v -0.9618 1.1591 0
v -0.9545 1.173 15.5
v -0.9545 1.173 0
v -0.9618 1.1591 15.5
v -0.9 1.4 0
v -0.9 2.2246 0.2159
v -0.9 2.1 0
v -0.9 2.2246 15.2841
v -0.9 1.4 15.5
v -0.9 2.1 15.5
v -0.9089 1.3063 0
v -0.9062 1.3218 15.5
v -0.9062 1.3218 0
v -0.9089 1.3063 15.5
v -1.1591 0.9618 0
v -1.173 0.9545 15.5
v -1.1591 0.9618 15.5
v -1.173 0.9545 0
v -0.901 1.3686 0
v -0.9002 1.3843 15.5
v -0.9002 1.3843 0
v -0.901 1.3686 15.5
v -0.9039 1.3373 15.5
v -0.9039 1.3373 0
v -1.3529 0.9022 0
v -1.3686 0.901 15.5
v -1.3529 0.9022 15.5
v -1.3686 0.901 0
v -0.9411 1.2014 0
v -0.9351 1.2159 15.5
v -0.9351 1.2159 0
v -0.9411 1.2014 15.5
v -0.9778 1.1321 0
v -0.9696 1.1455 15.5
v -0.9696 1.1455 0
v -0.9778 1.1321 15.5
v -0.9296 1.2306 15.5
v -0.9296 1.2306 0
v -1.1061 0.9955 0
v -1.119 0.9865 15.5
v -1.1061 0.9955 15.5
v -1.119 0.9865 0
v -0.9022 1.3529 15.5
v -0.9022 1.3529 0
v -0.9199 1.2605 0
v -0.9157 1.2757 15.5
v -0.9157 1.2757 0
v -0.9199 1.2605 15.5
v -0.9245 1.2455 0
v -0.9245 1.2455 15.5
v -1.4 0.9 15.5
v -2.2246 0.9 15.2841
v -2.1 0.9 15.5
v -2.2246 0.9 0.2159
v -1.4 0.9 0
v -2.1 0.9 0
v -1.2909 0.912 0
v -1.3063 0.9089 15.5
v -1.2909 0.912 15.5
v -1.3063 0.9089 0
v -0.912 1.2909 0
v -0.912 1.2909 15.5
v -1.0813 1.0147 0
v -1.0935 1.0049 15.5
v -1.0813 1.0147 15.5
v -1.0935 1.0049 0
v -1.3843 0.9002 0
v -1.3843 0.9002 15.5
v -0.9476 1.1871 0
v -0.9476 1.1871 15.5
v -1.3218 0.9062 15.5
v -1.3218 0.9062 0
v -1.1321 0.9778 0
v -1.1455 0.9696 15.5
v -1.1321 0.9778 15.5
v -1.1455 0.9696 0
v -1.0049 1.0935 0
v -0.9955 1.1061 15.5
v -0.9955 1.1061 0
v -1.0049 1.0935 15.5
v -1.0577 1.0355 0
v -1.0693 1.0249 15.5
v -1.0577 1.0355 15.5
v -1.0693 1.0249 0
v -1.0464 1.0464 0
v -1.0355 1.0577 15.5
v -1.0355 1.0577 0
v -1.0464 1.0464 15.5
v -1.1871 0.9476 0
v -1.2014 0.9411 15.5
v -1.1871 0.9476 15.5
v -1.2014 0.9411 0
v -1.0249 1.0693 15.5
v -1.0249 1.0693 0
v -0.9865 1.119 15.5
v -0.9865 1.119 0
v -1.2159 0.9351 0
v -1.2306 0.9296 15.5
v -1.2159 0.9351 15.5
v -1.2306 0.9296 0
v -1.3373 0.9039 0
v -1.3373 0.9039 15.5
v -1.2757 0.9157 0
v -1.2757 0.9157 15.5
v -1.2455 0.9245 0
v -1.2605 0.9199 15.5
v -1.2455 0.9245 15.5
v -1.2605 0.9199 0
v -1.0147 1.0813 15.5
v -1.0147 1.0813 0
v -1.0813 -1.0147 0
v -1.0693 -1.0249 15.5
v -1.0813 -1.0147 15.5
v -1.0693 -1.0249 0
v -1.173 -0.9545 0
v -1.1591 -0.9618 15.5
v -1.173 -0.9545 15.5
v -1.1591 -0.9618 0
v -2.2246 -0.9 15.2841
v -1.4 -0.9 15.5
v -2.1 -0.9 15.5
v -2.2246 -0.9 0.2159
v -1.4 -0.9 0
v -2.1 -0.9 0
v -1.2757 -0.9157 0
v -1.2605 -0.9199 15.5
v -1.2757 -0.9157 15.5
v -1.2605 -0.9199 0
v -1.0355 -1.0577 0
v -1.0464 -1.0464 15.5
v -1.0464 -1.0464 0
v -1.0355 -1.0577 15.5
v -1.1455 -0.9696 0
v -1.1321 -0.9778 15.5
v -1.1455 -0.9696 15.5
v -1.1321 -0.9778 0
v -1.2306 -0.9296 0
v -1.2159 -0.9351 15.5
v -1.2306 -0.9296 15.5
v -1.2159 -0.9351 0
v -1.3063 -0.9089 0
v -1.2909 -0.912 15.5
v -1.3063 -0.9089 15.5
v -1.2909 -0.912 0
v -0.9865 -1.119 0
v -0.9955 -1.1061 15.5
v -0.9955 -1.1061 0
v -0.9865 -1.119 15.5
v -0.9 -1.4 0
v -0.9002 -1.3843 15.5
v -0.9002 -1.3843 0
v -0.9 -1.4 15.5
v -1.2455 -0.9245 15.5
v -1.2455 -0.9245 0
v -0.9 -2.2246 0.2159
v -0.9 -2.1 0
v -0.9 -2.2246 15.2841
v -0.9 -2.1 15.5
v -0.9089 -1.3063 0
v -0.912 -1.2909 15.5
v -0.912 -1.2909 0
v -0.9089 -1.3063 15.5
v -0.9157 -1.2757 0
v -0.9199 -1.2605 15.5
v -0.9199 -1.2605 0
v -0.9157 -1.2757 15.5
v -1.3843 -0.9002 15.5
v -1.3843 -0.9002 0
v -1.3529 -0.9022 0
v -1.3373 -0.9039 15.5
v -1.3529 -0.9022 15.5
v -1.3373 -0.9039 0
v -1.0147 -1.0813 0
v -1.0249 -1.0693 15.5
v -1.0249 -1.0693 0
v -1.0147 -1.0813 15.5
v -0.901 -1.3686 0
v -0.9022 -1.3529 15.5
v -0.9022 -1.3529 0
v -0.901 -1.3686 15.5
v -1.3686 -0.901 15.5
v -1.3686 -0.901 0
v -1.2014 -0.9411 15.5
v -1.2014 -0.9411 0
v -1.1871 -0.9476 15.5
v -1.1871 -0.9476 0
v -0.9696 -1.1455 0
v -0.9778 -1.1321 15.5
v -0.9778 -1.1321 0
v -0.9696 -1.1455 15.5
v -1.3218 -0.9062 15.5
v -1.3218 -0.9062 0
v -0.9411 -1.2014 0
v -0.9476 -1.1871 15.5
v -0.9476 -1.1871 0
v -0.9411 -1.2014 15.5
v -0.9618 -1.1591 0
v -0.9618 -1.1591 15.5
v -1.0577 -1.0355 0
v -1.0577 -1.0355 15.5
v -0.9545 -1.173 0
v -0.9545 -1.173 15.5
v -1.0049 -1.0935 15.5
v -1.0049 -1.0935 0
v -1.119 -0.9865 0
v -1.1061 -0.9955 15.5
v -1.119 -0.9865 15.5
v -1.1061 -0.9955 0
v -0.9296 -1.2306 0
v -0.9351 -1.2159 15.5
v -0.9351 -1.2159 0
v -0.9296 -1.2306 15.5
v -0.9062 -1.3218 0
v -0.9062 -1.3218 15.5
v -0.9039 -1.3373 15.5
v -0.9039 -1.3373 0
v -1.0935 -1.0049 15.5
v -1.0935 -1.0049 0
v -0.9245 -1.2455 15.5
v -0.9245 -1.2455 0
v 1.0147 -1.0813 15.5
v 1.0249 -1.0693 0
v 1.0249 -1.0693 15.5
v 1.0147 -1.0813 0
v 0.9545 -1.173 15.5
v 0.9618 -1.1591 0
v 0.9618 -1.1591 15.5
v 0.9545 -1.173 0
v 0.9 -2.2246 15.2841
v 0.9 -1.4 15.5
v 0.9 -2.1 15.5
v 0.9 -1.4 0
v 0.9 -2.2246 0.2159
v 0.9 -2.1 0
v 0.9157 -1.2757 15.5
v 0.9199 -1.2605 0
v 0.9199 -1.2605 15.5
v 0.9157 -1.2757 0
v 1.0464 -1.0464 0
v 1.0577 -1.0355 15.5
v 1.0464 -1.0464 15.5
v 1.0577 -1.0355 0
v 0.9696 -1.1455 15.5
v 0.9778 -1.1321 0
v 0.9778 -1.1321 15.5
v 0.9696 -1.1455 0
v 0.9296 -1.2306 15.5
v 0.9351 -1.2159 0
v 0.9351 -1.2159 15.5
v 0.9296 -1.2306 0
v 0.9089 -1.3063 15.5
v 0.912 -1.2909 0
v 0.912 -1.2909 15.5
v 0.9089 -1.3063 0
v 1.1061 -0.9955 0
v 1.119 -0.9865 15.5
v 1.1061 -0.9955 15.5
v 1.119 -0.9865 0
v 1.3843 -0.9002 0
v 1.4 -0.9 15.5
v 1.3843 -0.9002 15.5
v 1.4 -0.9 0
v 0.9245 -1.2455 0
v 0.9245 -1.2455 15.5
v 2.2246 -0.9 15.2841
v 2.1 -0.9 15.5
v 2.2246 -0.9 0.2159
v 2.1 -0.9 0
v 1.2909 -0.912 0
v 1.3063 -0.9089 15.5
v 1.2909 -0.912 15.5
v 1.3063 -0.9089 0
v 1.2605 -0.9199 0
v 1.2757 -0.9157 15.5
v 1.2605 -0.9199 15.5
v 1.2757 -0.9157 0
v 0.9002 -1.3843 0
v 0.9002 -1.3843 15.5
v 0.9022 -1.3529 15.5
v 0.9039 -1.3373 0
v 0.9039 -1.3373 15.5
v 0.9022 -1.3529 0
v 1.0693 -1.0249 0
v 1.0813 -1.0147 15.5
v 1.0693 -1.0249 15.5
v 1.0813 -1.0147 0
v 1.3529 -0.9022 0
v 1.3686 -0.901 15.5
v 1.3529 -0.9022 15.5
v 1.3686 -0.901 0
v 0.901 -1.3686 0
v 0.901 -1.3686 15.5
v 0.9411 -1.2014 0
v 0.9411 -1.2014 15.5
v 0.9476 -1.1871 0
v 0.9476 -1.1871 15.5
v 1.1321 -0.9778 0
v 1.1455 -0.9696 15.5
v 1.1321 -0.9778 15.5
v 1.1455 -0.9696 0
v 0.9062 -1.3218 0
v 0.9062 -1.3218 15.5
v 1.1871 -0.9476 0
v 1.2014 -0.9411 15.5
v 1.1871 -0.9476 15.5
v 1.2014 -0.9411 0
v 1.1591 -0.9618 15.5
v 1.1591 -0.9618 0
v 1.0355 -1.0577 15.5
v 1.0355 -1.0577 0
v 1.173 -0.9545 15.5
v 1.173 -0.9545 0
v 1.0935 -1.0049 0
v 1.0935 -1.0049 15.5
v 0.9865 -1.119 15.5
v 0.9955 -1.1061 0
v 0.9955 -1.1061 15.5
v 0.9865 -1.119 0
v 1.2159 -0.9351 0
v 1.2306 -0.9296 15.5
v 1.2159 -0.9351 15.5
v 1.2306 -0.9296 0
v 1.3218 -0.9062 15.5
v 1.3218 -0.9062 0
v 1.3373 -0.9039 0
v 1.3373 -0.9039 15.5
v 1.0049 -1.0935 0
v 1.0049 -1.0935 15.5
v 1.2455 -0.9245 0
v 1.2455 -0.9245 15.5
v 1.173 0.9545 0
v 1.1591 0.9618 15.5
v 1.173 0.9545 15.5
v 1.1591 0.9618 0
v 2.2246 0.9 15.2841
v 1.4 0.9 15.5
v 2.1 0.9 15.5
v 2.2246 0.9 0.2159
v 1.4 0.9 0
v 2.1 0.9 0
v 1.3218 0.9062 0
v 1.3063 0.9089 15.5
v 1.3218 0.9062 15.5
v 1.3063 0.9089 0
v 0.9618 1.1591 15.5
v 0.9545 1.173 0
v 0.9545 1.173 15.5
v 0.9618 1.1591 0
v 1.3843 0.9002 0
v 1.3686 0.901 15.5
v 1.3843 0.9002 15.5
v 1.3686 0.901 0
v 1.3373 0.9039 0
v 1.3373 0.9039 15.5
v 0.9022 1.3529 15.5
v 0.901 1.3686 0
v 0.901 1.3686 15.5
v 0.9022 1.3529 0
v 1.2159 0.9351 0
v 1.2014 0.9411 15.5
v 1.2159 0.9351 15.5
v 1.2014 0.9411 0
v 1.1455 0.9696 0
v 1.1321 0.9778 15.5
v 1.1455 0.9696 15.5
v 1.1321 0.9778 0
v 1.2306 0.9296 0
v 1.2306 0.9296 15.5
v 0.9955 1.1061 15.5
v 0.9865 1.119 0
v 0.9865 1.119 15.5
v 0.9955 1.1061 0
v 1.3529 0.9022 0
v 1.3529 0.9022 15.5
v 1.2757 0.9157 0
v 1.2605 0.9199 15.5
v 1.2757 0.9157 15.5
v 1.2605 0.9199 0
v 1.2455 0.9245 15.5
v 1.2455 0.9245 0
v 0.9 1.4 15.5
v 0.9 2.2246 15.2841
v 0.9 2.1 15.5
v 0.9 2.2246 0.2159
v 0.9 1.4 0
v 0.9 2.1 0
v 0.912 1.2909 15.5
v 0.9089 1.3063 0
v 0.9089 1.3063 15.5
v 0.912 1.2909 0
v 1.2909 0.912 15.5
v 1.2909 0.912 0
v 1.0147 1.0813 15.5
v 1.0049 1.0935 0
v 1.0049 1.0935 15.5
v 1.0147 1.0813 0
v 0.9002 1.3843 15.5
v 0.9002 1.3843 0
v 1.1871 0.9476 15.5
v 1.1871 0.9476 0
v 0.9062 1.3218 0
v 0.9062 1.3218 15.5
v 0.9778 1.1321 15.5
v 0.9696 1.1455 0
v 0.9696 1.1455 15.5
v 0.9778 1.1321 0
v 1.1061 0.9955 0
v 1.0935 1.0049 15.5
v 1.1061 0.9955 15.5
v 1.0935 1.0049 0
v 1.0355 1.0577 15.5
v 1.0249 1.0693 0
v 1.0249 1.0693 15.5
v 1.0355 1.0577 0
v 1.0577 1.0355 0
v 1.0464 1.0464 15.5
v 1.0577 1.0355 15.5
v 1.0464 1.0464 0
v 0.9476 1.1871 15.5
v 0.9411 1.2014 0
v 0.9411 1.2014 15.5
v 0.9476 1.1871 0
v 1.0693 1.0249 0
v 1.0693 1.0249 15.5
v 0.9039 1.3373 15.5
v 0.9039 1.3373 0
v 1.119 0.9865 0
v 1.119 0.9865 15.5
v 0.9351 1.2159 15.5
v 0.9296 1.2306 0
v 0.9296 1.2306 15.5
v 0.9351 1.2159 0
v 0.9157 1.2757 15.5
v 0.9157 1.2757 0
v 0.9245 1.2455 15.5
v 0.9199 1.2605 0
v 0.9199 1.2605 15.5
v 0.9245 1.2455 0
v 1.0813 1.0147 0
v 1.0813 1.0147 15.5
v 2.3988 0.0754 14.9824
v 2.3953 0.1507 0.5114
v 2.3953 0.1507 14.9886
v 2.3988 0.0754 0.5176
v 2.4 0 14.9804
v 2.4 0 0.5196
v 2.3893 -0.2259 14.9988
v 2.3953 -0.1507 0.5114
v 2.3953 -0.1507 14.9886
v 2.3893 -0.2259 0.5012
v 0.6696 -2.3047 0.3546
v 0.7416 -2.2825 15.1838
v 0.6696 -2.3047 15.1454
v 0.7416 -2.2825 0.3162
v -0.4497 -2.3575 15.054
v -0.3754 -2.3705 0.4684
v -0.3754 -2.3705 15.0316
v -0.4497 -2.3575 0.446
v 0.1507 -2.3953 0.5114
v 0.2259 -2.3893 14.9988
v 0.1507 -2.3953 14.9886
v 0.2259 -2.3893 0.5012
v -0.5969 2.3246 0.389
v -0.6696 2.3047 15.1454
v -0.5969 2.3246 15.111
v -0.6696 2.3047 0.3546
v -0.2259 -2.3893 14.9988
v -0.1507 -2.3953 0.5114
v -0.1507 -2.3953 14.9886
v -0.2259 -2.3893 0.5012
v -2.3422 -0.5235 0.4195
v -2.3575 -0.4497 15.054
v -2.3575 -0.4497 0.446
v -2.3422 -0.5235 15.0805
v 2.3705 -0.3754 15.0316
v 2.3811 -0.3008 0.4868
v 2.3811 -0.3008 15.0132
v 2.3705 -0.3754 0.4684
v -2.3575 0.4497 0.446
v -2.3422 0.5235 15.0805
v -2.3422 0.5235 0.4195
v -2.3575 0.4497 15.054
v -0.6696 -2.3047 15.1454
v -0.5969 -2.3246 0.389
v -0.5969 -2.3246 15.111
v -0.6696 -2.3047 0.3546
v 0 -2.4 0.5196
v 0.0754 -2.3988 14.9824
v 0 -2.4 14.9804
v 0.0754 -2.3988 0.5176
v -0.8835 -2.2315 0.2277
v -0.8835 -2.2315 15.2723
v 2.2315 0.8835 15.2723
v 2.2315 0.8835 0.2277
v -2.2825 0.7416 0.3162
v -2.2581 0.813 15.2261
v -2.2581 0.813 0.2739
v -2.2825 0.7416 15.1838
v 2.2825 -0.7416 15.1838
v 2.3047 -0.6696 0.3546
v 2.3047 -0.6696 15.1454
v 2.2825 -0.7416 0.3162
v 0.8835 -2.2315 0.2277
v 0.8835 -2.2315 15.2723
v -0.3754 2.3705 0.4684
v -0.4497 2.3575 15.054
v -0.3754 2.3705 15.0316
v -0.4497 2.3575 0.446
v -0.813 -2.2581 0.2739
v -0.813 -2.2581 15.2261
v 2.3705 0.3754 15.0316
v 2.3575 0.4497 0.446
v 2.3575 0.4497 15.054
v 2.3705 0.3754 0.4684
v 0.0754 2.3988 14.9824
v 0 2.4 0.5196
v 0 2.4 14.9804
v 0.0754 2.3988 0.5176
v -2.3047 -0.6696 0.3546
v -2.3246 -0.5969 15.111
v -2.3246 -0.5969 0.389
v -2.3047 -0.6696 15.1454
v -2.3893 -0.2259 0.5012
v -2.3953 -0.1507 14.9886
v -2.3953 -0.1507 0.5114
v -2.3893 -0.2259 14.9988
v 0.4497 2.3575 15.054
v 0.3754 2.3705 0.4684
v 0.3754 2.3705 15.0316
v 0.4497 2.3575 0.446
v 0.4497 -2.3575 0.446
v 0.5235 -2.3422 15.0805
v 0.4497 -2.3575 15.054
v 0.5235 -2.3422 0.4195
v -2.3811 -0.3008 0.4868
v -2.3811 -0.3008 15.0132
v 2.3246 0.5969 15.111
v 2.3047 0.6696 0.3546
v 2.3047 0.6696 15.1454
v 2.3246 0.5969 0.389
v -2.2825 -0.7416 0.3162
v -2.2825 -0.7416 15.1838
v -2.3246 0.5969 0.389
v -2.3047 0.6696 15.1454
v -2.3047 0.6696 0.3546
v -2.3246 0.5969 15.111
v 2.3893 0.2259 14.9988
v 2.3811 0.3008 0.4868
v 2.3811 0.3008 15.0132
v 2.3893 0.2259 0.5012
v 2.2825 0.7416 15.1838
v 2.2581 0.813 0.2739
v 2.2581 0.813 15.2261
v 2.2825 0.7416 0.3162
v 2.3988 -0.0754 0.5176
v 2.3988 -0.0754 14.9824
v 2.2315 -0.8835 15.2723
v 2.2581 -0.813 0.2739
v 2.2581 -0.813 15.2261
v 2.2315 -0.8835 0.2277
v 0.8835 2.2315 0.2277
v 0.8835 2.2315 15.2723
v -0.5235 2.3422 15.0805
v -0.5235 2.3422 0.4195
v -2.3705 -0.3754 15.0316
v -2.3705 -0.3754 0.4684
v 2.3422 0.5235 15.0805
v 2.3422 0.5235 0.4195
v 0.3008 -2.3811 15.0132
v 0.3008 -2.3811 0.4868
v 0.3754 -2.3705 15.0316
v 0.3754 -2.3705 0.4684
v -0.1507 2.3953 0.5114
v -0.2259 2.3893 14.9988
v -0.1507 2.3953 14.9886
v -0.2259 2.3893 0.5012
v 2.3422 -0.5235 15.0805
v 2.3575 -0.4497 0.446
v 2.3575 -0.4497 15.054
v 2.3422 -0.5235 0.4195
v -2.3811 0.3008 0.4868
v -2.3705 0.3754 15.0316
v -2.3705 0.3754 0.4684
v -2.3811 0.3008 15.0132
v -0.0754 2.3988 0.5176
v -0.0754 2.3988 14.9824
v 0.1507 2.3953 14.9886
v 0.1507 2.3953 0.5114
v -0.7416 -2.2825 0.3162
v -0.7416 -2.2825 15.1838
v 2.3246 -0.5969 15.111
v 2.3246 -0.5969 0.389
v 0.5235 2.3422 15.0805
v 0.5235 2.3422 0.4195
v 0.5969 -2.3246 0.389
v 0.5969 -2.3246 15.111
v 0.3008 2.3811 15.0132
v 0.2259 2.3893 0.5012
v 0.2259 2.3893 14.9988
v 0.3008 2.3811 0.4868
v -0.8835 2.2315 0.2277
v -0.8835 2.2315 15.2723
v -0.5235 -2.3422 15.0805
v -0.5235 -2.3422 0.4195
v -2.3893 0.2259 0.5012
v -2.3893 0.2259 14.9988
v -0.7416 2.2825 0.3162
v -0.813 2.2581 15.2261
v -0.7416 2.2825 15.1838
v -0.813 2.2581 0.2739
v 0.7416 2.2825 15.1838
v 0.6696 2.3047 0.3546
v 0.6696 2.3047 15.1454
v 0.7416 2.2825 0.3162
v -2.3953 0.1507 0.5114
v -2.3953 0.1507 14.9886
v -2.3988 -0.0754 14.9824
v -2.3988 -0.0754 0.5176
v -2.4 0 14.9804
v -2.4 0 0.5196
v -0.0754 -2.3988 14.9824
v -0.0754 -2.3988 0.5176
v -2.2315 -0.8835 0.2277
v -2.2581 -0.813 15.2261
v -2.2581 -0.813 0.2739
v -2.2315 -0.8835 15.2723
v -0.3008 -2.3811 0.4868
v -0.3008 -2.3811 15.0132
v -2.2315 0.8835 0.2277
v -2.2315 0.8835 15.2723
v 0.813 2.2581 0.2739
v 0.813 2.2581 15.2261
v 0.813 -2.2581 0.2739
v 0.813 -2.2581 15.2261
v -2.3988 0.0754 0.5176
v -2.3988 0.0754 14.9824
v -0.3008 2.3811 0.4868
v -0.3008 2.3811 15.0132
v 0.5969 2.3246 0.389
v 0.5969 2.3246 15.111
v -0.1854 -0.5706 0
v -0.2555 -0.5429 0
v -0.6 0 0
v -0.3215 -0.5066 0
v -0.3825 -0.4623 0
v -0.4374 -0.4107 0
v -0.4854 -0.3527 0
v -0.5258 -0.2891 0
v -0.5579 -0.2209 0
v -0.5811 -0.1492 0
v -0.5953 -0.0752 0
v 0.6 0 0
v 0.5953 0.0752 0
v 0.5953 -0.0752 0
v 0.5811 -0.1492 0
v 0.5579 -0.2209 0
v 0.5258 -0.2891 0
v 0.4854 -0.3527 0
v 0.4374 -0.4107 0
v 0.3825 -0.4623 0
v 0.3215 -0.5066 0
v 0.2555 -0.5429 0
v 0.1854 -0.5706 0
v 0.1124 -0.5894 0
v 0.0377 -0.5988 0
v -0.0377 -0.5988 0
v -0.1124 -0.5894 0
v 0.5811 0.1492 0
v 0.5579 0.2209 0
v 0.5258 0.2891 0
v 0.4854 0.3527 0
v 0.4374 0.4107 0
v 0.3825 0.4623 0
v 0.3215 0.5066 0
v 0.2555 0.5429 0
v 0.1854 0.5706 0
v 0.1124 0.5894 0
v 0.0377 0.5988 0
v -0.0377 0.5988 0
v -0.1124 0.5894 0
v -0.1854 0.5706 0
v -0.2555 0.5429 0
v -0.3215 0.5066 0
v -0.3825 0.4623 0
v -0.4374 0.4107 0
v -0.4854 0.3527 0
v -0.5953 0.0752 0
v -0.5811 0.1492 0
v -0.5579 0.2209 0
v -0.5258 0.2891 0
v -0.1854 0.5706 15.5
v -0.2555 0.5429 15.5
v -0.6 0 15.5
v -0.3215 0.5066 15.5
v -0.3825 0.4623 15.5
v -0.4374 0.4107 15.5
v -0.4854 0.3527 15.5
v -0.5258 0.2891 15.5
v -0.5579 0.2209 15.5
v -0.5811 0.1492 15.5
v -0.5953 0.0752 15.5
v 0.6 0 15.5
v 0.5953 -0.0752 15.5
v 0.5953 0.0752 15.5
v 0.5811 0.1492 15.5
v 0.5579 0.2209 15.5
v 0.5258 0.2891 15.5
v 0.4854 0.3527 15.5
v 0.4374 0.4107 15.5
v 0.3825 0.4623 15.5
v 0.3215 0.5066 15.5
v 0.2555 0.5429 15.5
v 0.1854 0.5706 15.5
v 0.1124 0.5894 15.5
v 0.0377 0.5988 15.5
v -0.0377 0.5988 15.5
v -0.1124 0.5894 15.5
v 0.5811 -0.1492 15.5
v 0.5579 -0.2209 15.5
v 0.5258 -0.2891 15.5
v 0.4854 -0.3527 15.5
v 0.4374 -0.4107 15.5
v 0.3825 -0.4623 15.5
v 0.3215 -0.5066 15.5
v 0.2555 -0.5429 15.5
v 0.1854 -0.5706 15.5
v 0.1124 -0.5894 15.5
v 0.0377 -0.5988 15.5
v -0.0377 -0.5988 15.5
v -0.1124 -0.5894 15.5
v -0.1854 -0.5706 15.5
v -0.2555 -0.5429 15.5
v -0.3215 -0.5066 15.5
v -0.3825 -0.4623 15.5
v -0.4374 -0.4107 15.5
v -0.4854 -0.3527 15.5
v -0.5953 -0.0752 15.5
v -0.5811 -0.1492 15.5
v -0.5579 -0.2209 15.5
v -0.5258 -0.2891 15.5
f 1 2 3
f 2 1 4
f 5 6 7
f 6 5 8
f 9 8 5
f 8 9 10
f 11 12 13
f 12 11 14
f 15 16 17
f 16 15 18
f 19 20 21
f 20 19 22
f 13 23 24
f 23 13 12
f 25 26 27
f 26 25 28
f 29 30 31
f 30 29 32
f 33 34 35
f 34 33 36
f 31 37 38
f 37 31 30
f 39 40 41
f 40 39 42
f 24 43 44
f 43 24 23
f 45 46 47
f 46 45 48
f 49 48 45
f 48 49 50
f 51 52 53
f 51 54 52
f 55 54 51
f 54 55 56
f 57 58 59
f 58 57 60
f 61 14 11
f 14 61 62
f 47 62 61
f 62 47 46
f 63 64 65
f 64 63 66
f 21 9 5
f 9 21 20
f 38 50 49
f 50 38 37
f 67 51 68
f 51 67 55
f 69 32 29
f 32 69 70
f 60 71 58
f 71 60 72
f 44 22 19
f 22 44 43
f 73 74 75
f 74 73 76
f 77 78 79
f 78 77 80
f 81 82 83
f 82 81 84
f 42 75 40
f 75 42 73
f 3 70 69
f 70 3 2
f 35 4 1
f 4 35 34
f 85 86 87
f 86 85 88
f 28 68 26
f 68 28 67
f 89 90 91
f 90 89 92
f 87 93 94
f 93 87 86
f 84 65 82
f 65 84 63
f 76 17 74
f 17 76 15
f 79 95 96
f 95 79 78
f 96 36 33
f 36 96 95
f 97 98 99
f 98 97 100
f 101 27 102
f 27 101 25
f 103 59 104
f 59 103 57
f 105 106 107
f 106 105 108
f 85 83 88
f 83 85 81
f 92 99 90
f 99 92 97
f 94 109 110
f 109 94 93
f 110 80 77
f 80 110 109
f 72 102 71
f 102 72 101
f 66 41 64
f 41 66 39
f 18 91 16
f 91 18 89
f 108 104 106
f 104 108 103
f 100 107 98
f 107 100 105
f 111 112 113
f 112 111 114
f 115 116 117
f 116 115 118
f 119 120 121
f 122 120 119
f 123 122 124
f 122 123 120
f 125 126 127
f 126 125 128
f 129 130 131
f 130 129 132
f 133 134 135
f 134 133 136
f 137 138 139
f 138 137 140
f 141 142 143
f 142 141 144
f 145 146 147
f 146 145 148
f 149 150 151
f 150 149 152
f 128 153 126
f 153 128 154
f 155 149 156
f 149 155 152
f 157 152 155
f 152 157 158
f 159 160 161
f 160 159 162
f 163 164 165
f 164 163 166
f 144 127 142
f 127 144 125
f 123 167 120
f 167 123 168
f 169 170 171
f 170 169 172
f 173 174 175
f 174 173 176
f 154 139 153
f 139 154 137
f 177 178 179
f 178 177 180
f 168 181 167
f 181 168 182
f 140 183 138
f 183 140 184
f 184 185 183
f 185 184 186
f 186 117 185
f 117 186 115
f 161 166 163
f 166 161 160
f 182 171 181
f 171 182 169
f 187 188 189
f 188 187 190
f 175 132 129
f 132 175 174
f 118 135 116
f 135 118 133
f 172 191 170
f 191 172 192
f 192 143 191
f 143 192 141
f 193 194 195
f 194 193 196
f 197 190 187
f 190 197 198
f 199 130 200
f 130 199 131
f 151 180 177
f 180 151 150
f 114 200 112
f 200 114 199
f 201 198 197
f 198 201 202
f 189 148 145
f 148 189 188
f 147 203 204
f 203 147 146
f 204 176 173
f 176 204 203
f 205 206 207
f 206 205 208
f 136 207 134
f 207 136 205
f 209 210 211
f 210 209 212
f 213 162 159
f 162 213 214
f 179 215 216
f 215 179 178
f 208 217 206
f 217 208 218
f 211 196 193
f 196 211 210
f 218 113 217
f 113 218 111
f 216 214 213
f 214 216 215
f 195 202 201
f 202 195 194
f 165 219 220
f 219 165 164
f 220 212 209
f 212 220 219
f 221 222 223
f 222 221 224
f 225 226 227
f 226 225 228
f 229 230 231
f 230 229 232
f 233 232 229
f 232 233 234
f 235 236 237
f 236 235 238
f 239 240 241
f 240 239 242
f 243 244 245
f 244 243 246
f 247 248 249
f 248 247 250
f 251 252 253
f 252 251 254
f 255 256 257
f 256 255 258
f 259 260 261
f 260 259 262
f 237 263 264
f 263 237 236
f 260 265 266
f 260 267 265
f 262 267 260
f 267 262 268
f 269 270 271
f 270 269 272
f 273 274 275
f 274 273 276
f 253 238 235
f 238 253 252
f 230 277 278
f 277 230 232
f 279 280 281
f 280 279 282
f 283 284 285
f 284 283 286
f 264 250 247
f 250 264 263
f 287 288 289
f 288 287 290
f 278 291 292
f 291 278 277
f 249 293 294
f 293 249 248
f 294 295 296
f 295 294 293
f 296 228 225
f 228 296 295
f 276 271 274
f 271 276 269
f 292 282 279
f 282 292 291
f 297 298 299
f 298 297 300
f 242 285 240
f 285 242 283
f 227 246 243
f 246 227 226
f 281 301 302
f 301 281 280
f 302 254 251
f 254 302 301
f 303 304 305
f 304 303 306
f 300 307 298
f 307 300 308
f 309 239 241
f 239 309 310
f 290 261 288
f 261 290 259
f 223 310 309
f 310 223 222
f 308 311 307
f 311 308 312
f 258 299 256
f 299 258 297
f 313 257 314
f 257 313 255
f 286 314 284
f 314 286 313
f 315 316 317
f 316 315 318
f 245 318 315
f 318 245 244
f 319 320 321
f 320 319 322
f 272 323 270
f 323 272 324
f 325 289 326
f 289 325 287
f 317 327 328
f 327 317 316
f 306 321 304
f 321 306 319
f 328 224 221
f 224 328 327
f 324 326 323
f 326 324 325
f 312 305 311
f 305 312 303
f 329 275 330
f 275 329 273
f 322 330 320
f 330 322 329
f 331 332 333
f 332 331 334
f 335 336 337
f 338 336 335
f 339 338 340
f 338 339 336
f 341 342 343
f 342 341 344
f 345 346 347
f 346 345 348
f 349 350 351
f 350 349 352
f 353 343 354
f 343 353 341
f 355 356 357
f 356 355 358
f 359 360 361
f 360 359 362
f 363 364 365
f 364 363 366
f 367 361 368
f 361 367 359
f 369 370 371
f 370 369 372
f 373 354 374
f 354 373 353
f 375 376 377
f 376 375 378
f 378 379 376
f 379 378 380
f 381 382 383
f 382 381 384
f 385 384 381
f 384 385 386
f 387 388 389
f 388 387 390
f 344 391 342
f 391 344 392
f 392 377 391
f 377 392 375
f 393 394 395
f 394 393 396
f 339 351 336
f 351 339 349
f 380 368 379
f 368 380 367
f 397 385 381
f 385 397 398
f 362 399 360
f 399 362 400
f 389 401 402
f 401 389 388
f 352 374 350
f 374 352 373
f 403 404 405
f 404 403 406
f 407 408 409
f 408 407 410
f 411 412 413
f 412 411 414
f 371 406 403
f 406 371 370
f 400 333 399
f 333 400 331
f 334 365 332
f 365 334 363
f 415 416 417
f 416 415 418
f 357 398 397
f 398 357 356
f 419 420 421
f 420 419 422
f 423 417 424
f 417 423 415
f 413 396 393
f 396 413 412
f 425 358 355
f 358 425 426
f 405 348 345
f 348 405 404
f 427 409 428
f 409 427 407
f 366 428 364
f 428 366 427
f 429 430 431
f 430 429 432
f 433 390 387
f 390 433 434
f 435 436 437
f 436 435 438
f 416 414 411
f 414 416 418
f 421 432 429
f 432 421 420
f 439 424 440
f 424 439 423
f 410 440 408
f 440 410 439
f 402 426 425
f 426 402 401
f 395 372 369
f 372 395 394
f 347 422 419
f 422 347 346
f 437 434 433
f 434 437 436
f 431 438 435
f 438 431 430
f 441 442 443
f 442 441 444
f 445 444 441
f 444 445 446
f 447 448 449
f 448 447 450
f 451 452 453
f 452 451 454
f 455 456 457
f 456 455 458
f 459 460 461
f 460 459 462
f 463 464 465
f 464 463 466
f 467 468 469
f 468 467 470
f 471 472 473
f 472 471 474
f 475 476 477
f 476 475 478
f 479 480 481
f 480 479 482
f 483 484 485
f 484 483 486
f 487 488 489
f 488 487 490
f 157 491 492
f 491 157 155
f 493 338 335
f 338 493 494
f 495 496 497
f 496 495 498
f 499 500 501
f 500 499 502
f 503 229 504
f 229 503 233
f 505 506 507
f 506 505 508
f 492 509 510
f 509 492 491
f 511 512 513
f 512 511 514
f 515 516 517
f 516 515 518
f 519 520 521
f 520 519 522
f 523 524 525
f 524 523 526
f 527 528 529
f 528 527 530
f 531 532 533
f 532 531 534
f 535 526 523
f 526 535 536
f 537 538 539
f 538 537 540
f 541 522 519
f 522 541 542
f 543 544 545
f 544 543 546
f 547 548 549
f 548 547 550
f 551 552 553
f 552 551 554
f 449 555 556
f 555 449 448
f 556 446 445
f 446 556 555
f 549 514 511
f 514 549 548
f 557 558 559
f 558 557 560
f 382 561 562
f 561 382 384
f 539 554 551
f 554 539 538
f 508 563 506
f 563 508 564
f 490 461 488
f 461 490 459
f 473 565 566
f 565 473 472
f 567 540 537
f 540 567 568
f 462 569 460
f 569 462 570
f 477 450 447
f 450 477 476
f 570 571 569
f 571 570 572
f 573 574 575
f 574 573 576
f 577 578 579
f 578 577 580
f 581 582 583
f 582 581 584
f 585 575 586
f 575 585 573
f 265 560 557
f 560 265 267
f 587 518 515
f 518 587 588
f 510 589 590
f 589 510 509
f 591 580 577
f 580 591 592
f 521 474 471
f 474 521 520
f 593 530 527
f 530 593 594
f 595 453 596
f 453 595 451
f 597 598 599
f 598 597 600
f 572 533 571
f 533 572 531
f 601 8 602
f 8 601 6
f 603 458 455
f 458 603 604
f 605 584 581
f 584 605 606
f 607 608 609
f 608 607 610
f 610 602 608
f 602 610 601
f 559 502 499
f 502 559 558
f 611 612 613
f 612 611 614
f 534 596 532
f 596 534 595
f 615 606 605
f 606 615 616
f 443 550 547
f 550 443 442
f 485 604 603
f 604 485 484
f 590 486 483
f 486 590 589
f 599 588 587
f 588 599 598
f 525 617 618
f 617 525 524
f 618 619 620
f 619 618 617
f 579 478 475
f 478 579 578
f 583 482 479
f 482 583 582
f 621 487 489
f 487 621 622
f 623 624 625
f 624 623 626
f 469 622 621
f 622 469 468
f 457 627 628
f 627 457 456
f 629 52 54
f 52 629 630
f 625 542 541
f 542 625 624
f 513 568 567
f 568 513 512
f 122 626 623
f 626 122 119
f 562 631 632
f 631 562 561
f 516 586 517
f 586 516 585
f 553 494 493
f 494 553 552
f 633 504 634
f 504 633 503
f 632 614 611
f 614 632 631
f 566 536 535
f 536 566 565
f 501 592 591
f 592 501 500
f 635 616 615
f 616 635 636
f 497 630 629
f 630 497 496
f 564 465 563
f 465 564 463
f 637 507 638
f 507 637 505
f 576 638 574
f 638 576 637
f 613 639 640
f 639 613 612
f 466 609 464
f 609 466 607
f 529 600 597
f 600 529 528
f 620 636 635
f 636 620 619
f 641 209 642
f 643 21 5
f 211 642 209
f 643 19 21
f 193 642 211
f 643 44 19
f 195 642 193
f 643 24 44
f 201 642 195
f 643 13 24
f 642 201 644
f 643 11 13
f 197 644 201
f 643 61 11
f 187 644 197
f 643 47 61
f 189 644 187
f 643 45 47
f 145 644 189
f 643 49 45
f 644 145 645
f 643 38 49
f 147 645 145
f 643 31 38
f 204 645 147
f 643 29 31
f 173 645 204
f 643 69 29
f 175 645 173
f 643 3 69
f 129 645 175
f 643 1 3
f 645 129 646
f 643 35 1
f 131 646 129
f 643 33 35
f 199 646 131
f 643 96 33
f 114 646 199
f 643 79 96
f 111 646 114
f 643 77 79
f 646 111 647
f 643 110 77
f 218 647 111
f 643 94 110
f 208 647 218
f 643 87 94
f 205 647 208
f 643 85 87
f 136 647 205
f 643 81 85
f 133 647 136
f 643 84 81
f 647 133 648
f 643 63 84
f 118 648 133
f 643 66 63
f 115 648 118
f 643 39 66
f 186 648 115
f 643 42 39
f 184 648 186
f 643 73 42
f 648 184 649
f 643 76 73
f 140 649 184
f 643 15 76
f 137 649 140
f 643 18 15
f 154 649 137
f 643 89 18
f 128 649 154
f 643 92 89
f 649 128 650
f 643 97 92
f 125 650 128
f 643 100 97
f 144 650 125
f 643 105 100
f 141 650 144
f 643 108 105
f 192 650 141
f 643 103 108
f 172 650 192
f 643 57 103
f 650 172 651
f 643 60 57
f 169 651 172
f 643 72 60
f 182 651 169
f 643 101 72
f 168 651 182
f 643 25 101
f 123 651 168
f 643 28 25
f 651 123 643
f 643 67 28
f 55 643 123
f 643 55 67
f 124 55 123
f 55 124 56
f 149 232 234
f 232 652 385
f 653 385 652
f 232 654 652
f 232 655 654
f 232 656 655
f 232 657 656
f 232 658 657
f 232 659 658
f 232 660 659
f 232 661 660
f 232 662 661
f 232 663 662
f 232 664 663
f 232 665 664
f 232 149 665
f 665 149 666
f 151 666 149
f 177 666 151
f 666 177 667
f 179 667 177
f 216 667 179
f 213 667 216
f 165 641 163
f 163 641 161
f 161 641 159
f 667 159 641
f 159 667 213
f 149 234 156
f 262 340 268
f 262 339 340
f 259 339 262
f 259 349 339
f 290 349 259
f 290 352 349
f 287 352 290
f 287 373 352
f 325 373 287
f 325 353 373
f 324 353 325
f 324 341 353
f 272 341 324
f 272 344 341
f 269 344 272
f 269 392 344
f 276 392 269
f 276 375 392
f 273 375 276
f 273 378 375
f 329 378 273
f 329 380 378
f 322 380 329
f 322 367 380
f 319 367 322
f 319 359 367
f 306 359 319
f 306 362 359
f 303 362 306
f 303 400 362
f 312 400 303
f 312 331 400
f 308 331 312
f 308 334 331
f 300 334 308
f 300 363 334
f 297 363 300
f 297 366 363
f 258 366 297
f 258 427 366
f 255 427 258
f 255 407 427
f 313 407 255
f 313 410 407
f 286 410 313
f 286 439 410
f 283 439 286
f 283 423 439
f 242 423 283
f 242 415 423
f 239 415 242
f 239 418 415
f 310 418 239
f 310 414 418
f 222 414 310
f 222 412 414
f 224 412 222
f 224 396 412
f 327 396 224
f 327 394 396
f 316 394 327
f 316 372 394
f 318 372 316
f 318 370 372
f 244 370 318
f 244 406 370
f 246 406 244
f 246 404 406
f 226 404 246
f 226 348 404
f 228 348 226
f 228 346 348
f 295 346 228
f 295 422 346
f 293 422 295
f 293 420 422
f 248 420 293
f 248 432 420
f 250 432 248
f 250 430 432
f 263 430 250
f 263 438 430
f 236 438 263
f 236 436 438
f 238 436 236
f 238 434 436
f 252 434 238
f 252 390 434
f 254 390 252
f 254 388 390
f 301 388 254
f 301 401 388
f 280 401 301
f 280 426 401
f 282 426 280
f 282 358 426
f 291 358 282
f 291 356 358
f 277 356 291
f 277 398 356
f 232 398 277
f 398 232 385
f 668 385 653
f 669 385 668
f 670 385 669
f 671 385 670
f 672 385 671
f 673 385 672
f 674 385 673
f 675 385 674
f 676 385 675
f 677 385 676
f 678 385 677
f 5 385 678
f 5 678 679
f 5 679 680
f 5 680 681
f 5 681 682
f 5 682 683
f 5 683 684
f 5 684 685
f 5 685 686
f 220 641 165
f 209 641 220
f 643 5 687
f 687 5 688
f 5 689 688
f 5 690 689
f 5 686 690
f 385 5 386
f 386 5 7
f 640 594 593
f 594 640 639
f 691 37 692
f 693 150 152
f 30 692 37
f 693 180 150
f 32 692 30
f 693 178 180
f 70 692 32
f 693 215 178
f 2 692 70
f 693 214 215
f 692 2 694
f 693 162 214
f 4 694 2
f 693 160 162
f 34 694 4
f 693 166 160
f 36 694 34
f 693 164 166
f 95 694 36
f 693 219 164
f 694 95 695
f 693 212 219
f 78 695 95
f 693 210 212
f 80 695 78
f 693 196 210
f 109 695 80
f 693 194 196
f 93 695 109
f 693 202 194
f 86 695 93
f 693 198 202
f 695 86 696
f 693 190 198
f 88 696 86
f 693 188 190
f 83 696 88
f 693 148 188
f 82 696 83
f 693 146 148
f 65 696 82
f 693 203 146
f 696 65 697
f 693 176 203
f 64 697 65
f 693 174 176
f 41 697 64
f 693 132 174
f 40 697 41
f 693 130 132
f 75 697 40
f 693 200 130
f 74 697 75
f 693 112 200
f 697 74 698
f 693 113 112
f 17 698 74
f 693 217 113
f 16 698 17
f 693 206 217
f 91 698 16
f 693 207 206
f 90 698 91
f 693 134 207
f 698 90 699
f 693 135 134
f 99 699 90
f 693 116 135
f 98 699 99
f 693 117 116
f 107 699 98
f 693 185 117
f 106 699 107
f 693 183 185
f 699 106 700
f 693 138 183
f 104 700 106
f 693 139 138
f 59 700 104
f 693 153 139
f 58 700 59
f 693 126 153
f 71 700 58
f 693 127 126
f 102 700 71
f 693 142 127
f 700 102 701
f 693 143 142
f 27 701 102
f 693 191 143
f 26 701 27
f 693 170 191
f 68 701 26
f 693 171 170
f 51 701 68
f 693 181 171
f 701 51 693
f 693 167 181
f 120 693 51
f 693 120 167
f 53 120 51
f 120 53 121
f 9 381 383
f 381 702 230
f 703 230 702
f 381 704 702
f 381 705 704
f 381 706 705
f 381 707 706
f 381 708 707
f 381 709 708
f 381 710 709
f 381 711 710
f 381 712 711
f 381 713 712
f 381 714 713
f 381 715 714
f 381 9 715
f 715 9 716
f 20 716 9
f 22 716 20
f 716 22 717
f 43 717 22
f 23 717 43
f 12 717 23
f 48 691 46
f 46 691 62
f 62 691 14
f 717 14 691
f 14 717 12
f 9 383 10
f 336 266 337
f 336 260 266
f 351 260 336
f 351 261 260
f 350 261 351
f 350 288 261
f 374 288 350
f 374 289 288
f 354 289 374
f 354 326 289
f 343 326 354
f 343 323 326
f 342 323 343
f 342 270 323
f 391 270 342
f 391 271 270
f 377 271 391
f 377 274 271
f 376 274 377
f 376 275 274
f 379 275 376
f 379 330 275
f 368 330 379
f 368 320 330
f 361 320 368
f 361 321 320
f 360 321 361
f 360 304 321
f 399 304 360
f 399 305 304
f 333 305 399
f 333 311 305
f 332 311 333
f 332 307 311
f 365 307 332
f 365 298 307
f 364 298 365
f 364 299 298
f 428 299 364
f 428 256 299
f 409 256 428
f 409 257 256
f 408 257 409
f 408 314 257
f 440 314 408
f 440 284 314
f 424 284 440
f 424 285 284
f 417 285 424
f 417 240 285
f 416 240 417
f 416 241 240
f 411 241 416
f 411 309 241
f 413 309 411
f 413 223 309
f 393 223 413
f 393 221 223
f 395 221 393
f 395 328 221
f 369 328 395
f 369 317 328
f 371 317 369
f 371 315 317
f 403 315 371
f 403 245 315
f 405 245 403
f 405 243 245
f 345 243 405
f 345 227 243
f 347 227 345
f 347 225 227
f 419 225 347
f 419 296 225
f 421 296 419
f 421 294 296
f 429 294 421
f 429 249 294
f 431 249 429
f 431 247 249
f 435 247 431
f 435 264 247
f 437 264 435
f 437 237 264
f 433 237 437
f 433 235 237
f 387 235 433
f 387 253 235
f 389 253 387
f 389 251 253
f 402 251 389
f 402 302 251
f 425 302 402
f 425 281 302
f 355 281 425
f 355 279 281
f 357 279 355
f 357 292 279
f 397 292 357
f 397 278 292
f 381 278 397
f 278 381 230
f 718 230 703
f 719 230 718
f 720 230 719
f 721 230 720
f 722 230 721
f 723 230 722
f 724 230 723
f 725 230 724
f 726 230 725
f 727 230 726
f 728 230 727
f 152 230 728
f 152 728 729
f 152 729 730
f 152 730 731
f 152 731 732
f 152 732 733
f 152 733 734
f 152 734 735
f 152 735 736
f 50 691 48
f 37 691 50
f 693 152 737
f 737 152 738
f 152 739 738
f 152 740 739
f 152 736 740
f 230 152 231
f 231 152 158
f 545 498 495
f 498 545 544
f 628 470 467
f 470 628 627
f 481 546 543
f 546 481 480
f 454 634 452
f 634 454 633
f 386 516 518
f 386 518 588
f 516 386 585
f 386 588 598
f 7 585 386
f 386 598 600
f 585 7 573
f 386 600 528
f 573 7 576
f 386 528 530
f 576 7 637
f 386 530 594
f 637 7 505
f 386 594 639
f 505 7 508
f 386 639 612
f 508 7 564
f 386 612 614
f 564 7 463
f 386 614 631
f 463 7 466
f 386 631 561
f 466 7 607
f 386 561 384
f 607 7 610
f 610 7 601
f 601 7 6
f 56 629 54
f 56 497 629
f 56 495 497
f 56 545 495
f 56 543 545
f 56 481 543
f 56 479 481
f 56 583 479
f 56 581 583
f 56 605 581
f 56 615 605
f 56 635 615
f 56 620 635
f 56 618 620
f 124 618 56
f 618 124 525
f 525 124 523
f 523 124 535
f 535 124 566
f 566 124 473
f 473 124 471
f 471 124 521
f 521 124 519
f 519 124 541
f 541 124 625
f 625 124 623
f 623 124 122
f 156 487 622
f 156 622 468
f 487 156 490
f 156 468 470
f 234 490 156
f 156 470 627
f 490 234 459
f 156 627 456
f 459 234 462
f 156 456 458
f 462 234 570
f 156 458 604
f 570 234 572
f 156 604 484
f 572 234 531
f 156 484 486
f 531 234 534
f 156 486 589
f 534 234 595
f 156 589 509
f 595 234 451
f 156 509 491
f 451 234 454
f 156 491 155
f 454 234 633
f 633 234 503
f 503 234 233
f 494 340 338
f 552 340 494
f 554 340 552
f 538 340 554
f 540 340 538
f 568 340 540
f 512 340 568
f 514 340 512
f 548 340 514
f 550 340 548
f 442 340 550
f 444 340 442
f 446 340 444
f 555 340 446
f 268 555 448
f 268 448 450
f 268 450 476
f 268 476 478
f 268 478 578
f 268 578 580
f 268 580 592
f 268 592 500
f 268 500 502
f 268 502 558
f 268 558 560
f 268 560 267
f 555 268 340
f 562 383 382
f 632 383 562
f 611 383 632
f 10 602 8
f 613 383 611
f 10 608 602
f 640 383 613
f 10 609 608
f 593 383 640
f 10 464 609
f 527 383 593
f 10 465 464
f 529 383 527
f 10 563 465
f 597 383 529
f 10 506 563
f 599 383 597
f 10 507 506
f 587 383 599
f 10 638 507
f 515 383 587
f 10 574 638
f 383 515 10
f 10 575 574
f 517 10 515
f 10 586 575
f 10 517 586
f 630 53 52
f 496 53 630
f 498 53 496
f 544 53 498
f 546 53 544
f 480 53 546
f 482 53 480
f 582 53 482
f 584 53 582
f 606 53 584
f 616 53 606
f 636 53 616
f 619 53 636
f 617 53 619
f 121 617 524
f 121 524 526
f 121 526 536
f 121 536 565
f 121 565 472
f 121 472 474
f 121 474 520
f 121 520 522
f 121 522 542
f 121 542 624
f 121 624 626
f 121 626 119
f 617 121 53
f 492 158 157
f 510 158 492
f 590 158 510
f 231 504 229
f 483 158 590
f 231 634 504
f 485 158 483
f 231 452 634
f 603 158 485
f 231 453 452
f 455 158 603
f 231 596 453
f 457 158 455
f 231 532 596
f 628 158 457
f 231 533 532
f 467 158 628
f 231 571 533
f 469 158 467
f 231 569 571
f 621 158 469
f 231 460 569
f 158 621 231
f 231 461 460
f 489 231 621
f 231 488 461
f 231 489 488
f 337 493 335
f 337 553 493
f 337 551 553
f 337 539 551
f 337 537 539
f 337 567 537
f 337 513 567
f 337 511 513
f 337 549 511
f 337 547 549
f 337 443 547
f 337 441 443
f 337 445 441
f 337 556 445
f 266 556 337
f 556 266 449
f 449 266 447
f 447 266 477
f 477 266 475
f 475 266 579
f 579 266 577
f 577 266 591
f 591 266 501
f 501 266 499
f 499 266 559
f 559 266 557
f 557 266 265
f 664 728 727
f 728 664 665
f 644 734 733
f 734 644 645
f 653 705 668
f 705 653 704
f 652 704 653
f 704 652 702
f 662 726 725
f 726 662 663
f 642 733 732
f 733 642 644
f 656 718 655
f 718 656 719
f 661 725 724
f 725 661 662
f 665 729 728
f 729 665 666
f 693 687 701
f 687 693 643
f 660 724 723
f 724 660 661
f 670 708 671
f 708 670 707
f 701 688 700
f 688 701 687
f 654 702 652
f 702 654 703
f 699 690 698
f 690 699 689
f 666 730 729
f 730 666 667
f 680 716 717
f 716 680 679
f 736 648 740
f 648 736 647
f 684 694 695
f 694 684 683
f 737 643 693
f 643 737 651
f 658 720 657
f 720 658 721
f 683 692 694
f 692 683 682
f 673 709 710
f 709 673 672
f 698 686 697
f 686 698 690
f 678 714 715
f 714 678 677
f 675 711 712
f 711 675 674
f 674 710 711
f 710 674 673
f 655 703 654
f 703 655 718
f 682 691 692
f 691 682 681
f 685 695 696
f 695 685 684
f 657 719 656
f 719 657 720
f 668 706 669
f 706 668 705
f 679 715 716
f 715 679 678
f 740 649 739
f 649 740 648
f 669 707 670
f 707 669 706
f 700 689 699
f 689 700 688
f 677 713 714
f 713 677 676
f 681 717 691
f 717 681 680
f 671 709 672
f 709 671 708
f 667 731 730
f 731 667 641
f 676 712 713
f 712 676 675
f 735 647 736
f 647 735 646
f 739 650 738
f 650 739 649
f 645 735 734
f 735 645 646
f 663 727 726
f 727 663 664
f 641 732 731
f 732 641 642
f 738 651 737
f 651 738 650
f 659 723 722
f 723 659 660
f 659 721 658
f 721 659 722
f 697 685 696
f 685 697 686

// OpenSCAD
eps = 0.001;

modelScale = 1.0;


nrOfUnits = 2;
addScrewHole = true;
rScrewHole = 3.0/2/2.5;


// printability corrections; values should be zero for real object dimensions 
PRINTABLE = 0;
correction_r1 = PRINTABLE ? 0.1 : 0.0;
correction_r2 = PRINTABLE ? 0.1 : 0.0;




// axle
r1 = (4.8/2 + correction_r1)*modelScale;
r2 = (1.0/2 + correction_r2)*modelScale;
offset_r2 = 1.4*modelScale;

axleBaseLength = -0.5*modelScale;
axleLengthUnit = 8.0*modelScale;


// camfer
camferAngle = 60;
camferWidth = 0.3;



module drawCamferSingle()
{
    smallSize = 4*r1;
    translate([0,r1-camferWidth,0]) rotate([camferAngle,0,0]) translate([-smallSize/2,-smallSize/2,-smallSize]) cube([smallSize,smallSize,smallSize]);
}


module drawCamfer()
{
    drawCamferSingle();
    rotate([0,0,90]) drawCamferSingle();
    rotate([0,0,180]) drawCamferSingle();
    rotate([0,0,270]) drawCamferSingle();
}


module drawAxleCutOut(prmLength)
{
    smallSize = 6*r2;   
    translate([-offset_r2,offset_r2,0]) hull()
    {
        translate([0,0,-eps]) cylinder(prmLength+2*eps,r2,r2,$fn=200*modelScale);
        translate([-smallSize,-r2,-eps]) cube([eps,2*r2,prmLength+2*eps]);
        translate([-r2,smallSize,-eps]) cube([2*r2,eps,prmLength+2*eps]);
    }
}    


module drawAxleEx(prmLength)
{	
    echo("prmLength",prmLength);
	difference()
	{
		union()
		{
			cylinder(prmLength,r1,r1,$fn=200*modelScale);
		}
		union()
		{
            drawAxleCutOut(prmLength);
            rotate([0,0,90]) drawAxleCutOut(prmLength);
            rotate([0,0,180]) drawAxleCutOut(prmLength);
            rotate([0,0,270]) drawAxleCutOut(prmLength);
		}
	}
}


module drawAxle()
{
    length = axleBaseLength+nrOfUnits*axleLengthUnit;
    difference()
	{
        union()
        {
            drawAxleEx(length);
        }
        union()
        {
            if (addScrewHole)
            {
                translate([0,0,-2*eps]) cylinder(length+4*eps,rScrewHole,rScrewHole,$fn=50*modelScale);
            }
            drawCamfer();
            translate([0,0,length]) mirror([0,0,1]) drawCamfer();
        }
    }
}


// tests
//drawCamfer();
//drawAxleCutOut(2);


// parts
drawAxle();
